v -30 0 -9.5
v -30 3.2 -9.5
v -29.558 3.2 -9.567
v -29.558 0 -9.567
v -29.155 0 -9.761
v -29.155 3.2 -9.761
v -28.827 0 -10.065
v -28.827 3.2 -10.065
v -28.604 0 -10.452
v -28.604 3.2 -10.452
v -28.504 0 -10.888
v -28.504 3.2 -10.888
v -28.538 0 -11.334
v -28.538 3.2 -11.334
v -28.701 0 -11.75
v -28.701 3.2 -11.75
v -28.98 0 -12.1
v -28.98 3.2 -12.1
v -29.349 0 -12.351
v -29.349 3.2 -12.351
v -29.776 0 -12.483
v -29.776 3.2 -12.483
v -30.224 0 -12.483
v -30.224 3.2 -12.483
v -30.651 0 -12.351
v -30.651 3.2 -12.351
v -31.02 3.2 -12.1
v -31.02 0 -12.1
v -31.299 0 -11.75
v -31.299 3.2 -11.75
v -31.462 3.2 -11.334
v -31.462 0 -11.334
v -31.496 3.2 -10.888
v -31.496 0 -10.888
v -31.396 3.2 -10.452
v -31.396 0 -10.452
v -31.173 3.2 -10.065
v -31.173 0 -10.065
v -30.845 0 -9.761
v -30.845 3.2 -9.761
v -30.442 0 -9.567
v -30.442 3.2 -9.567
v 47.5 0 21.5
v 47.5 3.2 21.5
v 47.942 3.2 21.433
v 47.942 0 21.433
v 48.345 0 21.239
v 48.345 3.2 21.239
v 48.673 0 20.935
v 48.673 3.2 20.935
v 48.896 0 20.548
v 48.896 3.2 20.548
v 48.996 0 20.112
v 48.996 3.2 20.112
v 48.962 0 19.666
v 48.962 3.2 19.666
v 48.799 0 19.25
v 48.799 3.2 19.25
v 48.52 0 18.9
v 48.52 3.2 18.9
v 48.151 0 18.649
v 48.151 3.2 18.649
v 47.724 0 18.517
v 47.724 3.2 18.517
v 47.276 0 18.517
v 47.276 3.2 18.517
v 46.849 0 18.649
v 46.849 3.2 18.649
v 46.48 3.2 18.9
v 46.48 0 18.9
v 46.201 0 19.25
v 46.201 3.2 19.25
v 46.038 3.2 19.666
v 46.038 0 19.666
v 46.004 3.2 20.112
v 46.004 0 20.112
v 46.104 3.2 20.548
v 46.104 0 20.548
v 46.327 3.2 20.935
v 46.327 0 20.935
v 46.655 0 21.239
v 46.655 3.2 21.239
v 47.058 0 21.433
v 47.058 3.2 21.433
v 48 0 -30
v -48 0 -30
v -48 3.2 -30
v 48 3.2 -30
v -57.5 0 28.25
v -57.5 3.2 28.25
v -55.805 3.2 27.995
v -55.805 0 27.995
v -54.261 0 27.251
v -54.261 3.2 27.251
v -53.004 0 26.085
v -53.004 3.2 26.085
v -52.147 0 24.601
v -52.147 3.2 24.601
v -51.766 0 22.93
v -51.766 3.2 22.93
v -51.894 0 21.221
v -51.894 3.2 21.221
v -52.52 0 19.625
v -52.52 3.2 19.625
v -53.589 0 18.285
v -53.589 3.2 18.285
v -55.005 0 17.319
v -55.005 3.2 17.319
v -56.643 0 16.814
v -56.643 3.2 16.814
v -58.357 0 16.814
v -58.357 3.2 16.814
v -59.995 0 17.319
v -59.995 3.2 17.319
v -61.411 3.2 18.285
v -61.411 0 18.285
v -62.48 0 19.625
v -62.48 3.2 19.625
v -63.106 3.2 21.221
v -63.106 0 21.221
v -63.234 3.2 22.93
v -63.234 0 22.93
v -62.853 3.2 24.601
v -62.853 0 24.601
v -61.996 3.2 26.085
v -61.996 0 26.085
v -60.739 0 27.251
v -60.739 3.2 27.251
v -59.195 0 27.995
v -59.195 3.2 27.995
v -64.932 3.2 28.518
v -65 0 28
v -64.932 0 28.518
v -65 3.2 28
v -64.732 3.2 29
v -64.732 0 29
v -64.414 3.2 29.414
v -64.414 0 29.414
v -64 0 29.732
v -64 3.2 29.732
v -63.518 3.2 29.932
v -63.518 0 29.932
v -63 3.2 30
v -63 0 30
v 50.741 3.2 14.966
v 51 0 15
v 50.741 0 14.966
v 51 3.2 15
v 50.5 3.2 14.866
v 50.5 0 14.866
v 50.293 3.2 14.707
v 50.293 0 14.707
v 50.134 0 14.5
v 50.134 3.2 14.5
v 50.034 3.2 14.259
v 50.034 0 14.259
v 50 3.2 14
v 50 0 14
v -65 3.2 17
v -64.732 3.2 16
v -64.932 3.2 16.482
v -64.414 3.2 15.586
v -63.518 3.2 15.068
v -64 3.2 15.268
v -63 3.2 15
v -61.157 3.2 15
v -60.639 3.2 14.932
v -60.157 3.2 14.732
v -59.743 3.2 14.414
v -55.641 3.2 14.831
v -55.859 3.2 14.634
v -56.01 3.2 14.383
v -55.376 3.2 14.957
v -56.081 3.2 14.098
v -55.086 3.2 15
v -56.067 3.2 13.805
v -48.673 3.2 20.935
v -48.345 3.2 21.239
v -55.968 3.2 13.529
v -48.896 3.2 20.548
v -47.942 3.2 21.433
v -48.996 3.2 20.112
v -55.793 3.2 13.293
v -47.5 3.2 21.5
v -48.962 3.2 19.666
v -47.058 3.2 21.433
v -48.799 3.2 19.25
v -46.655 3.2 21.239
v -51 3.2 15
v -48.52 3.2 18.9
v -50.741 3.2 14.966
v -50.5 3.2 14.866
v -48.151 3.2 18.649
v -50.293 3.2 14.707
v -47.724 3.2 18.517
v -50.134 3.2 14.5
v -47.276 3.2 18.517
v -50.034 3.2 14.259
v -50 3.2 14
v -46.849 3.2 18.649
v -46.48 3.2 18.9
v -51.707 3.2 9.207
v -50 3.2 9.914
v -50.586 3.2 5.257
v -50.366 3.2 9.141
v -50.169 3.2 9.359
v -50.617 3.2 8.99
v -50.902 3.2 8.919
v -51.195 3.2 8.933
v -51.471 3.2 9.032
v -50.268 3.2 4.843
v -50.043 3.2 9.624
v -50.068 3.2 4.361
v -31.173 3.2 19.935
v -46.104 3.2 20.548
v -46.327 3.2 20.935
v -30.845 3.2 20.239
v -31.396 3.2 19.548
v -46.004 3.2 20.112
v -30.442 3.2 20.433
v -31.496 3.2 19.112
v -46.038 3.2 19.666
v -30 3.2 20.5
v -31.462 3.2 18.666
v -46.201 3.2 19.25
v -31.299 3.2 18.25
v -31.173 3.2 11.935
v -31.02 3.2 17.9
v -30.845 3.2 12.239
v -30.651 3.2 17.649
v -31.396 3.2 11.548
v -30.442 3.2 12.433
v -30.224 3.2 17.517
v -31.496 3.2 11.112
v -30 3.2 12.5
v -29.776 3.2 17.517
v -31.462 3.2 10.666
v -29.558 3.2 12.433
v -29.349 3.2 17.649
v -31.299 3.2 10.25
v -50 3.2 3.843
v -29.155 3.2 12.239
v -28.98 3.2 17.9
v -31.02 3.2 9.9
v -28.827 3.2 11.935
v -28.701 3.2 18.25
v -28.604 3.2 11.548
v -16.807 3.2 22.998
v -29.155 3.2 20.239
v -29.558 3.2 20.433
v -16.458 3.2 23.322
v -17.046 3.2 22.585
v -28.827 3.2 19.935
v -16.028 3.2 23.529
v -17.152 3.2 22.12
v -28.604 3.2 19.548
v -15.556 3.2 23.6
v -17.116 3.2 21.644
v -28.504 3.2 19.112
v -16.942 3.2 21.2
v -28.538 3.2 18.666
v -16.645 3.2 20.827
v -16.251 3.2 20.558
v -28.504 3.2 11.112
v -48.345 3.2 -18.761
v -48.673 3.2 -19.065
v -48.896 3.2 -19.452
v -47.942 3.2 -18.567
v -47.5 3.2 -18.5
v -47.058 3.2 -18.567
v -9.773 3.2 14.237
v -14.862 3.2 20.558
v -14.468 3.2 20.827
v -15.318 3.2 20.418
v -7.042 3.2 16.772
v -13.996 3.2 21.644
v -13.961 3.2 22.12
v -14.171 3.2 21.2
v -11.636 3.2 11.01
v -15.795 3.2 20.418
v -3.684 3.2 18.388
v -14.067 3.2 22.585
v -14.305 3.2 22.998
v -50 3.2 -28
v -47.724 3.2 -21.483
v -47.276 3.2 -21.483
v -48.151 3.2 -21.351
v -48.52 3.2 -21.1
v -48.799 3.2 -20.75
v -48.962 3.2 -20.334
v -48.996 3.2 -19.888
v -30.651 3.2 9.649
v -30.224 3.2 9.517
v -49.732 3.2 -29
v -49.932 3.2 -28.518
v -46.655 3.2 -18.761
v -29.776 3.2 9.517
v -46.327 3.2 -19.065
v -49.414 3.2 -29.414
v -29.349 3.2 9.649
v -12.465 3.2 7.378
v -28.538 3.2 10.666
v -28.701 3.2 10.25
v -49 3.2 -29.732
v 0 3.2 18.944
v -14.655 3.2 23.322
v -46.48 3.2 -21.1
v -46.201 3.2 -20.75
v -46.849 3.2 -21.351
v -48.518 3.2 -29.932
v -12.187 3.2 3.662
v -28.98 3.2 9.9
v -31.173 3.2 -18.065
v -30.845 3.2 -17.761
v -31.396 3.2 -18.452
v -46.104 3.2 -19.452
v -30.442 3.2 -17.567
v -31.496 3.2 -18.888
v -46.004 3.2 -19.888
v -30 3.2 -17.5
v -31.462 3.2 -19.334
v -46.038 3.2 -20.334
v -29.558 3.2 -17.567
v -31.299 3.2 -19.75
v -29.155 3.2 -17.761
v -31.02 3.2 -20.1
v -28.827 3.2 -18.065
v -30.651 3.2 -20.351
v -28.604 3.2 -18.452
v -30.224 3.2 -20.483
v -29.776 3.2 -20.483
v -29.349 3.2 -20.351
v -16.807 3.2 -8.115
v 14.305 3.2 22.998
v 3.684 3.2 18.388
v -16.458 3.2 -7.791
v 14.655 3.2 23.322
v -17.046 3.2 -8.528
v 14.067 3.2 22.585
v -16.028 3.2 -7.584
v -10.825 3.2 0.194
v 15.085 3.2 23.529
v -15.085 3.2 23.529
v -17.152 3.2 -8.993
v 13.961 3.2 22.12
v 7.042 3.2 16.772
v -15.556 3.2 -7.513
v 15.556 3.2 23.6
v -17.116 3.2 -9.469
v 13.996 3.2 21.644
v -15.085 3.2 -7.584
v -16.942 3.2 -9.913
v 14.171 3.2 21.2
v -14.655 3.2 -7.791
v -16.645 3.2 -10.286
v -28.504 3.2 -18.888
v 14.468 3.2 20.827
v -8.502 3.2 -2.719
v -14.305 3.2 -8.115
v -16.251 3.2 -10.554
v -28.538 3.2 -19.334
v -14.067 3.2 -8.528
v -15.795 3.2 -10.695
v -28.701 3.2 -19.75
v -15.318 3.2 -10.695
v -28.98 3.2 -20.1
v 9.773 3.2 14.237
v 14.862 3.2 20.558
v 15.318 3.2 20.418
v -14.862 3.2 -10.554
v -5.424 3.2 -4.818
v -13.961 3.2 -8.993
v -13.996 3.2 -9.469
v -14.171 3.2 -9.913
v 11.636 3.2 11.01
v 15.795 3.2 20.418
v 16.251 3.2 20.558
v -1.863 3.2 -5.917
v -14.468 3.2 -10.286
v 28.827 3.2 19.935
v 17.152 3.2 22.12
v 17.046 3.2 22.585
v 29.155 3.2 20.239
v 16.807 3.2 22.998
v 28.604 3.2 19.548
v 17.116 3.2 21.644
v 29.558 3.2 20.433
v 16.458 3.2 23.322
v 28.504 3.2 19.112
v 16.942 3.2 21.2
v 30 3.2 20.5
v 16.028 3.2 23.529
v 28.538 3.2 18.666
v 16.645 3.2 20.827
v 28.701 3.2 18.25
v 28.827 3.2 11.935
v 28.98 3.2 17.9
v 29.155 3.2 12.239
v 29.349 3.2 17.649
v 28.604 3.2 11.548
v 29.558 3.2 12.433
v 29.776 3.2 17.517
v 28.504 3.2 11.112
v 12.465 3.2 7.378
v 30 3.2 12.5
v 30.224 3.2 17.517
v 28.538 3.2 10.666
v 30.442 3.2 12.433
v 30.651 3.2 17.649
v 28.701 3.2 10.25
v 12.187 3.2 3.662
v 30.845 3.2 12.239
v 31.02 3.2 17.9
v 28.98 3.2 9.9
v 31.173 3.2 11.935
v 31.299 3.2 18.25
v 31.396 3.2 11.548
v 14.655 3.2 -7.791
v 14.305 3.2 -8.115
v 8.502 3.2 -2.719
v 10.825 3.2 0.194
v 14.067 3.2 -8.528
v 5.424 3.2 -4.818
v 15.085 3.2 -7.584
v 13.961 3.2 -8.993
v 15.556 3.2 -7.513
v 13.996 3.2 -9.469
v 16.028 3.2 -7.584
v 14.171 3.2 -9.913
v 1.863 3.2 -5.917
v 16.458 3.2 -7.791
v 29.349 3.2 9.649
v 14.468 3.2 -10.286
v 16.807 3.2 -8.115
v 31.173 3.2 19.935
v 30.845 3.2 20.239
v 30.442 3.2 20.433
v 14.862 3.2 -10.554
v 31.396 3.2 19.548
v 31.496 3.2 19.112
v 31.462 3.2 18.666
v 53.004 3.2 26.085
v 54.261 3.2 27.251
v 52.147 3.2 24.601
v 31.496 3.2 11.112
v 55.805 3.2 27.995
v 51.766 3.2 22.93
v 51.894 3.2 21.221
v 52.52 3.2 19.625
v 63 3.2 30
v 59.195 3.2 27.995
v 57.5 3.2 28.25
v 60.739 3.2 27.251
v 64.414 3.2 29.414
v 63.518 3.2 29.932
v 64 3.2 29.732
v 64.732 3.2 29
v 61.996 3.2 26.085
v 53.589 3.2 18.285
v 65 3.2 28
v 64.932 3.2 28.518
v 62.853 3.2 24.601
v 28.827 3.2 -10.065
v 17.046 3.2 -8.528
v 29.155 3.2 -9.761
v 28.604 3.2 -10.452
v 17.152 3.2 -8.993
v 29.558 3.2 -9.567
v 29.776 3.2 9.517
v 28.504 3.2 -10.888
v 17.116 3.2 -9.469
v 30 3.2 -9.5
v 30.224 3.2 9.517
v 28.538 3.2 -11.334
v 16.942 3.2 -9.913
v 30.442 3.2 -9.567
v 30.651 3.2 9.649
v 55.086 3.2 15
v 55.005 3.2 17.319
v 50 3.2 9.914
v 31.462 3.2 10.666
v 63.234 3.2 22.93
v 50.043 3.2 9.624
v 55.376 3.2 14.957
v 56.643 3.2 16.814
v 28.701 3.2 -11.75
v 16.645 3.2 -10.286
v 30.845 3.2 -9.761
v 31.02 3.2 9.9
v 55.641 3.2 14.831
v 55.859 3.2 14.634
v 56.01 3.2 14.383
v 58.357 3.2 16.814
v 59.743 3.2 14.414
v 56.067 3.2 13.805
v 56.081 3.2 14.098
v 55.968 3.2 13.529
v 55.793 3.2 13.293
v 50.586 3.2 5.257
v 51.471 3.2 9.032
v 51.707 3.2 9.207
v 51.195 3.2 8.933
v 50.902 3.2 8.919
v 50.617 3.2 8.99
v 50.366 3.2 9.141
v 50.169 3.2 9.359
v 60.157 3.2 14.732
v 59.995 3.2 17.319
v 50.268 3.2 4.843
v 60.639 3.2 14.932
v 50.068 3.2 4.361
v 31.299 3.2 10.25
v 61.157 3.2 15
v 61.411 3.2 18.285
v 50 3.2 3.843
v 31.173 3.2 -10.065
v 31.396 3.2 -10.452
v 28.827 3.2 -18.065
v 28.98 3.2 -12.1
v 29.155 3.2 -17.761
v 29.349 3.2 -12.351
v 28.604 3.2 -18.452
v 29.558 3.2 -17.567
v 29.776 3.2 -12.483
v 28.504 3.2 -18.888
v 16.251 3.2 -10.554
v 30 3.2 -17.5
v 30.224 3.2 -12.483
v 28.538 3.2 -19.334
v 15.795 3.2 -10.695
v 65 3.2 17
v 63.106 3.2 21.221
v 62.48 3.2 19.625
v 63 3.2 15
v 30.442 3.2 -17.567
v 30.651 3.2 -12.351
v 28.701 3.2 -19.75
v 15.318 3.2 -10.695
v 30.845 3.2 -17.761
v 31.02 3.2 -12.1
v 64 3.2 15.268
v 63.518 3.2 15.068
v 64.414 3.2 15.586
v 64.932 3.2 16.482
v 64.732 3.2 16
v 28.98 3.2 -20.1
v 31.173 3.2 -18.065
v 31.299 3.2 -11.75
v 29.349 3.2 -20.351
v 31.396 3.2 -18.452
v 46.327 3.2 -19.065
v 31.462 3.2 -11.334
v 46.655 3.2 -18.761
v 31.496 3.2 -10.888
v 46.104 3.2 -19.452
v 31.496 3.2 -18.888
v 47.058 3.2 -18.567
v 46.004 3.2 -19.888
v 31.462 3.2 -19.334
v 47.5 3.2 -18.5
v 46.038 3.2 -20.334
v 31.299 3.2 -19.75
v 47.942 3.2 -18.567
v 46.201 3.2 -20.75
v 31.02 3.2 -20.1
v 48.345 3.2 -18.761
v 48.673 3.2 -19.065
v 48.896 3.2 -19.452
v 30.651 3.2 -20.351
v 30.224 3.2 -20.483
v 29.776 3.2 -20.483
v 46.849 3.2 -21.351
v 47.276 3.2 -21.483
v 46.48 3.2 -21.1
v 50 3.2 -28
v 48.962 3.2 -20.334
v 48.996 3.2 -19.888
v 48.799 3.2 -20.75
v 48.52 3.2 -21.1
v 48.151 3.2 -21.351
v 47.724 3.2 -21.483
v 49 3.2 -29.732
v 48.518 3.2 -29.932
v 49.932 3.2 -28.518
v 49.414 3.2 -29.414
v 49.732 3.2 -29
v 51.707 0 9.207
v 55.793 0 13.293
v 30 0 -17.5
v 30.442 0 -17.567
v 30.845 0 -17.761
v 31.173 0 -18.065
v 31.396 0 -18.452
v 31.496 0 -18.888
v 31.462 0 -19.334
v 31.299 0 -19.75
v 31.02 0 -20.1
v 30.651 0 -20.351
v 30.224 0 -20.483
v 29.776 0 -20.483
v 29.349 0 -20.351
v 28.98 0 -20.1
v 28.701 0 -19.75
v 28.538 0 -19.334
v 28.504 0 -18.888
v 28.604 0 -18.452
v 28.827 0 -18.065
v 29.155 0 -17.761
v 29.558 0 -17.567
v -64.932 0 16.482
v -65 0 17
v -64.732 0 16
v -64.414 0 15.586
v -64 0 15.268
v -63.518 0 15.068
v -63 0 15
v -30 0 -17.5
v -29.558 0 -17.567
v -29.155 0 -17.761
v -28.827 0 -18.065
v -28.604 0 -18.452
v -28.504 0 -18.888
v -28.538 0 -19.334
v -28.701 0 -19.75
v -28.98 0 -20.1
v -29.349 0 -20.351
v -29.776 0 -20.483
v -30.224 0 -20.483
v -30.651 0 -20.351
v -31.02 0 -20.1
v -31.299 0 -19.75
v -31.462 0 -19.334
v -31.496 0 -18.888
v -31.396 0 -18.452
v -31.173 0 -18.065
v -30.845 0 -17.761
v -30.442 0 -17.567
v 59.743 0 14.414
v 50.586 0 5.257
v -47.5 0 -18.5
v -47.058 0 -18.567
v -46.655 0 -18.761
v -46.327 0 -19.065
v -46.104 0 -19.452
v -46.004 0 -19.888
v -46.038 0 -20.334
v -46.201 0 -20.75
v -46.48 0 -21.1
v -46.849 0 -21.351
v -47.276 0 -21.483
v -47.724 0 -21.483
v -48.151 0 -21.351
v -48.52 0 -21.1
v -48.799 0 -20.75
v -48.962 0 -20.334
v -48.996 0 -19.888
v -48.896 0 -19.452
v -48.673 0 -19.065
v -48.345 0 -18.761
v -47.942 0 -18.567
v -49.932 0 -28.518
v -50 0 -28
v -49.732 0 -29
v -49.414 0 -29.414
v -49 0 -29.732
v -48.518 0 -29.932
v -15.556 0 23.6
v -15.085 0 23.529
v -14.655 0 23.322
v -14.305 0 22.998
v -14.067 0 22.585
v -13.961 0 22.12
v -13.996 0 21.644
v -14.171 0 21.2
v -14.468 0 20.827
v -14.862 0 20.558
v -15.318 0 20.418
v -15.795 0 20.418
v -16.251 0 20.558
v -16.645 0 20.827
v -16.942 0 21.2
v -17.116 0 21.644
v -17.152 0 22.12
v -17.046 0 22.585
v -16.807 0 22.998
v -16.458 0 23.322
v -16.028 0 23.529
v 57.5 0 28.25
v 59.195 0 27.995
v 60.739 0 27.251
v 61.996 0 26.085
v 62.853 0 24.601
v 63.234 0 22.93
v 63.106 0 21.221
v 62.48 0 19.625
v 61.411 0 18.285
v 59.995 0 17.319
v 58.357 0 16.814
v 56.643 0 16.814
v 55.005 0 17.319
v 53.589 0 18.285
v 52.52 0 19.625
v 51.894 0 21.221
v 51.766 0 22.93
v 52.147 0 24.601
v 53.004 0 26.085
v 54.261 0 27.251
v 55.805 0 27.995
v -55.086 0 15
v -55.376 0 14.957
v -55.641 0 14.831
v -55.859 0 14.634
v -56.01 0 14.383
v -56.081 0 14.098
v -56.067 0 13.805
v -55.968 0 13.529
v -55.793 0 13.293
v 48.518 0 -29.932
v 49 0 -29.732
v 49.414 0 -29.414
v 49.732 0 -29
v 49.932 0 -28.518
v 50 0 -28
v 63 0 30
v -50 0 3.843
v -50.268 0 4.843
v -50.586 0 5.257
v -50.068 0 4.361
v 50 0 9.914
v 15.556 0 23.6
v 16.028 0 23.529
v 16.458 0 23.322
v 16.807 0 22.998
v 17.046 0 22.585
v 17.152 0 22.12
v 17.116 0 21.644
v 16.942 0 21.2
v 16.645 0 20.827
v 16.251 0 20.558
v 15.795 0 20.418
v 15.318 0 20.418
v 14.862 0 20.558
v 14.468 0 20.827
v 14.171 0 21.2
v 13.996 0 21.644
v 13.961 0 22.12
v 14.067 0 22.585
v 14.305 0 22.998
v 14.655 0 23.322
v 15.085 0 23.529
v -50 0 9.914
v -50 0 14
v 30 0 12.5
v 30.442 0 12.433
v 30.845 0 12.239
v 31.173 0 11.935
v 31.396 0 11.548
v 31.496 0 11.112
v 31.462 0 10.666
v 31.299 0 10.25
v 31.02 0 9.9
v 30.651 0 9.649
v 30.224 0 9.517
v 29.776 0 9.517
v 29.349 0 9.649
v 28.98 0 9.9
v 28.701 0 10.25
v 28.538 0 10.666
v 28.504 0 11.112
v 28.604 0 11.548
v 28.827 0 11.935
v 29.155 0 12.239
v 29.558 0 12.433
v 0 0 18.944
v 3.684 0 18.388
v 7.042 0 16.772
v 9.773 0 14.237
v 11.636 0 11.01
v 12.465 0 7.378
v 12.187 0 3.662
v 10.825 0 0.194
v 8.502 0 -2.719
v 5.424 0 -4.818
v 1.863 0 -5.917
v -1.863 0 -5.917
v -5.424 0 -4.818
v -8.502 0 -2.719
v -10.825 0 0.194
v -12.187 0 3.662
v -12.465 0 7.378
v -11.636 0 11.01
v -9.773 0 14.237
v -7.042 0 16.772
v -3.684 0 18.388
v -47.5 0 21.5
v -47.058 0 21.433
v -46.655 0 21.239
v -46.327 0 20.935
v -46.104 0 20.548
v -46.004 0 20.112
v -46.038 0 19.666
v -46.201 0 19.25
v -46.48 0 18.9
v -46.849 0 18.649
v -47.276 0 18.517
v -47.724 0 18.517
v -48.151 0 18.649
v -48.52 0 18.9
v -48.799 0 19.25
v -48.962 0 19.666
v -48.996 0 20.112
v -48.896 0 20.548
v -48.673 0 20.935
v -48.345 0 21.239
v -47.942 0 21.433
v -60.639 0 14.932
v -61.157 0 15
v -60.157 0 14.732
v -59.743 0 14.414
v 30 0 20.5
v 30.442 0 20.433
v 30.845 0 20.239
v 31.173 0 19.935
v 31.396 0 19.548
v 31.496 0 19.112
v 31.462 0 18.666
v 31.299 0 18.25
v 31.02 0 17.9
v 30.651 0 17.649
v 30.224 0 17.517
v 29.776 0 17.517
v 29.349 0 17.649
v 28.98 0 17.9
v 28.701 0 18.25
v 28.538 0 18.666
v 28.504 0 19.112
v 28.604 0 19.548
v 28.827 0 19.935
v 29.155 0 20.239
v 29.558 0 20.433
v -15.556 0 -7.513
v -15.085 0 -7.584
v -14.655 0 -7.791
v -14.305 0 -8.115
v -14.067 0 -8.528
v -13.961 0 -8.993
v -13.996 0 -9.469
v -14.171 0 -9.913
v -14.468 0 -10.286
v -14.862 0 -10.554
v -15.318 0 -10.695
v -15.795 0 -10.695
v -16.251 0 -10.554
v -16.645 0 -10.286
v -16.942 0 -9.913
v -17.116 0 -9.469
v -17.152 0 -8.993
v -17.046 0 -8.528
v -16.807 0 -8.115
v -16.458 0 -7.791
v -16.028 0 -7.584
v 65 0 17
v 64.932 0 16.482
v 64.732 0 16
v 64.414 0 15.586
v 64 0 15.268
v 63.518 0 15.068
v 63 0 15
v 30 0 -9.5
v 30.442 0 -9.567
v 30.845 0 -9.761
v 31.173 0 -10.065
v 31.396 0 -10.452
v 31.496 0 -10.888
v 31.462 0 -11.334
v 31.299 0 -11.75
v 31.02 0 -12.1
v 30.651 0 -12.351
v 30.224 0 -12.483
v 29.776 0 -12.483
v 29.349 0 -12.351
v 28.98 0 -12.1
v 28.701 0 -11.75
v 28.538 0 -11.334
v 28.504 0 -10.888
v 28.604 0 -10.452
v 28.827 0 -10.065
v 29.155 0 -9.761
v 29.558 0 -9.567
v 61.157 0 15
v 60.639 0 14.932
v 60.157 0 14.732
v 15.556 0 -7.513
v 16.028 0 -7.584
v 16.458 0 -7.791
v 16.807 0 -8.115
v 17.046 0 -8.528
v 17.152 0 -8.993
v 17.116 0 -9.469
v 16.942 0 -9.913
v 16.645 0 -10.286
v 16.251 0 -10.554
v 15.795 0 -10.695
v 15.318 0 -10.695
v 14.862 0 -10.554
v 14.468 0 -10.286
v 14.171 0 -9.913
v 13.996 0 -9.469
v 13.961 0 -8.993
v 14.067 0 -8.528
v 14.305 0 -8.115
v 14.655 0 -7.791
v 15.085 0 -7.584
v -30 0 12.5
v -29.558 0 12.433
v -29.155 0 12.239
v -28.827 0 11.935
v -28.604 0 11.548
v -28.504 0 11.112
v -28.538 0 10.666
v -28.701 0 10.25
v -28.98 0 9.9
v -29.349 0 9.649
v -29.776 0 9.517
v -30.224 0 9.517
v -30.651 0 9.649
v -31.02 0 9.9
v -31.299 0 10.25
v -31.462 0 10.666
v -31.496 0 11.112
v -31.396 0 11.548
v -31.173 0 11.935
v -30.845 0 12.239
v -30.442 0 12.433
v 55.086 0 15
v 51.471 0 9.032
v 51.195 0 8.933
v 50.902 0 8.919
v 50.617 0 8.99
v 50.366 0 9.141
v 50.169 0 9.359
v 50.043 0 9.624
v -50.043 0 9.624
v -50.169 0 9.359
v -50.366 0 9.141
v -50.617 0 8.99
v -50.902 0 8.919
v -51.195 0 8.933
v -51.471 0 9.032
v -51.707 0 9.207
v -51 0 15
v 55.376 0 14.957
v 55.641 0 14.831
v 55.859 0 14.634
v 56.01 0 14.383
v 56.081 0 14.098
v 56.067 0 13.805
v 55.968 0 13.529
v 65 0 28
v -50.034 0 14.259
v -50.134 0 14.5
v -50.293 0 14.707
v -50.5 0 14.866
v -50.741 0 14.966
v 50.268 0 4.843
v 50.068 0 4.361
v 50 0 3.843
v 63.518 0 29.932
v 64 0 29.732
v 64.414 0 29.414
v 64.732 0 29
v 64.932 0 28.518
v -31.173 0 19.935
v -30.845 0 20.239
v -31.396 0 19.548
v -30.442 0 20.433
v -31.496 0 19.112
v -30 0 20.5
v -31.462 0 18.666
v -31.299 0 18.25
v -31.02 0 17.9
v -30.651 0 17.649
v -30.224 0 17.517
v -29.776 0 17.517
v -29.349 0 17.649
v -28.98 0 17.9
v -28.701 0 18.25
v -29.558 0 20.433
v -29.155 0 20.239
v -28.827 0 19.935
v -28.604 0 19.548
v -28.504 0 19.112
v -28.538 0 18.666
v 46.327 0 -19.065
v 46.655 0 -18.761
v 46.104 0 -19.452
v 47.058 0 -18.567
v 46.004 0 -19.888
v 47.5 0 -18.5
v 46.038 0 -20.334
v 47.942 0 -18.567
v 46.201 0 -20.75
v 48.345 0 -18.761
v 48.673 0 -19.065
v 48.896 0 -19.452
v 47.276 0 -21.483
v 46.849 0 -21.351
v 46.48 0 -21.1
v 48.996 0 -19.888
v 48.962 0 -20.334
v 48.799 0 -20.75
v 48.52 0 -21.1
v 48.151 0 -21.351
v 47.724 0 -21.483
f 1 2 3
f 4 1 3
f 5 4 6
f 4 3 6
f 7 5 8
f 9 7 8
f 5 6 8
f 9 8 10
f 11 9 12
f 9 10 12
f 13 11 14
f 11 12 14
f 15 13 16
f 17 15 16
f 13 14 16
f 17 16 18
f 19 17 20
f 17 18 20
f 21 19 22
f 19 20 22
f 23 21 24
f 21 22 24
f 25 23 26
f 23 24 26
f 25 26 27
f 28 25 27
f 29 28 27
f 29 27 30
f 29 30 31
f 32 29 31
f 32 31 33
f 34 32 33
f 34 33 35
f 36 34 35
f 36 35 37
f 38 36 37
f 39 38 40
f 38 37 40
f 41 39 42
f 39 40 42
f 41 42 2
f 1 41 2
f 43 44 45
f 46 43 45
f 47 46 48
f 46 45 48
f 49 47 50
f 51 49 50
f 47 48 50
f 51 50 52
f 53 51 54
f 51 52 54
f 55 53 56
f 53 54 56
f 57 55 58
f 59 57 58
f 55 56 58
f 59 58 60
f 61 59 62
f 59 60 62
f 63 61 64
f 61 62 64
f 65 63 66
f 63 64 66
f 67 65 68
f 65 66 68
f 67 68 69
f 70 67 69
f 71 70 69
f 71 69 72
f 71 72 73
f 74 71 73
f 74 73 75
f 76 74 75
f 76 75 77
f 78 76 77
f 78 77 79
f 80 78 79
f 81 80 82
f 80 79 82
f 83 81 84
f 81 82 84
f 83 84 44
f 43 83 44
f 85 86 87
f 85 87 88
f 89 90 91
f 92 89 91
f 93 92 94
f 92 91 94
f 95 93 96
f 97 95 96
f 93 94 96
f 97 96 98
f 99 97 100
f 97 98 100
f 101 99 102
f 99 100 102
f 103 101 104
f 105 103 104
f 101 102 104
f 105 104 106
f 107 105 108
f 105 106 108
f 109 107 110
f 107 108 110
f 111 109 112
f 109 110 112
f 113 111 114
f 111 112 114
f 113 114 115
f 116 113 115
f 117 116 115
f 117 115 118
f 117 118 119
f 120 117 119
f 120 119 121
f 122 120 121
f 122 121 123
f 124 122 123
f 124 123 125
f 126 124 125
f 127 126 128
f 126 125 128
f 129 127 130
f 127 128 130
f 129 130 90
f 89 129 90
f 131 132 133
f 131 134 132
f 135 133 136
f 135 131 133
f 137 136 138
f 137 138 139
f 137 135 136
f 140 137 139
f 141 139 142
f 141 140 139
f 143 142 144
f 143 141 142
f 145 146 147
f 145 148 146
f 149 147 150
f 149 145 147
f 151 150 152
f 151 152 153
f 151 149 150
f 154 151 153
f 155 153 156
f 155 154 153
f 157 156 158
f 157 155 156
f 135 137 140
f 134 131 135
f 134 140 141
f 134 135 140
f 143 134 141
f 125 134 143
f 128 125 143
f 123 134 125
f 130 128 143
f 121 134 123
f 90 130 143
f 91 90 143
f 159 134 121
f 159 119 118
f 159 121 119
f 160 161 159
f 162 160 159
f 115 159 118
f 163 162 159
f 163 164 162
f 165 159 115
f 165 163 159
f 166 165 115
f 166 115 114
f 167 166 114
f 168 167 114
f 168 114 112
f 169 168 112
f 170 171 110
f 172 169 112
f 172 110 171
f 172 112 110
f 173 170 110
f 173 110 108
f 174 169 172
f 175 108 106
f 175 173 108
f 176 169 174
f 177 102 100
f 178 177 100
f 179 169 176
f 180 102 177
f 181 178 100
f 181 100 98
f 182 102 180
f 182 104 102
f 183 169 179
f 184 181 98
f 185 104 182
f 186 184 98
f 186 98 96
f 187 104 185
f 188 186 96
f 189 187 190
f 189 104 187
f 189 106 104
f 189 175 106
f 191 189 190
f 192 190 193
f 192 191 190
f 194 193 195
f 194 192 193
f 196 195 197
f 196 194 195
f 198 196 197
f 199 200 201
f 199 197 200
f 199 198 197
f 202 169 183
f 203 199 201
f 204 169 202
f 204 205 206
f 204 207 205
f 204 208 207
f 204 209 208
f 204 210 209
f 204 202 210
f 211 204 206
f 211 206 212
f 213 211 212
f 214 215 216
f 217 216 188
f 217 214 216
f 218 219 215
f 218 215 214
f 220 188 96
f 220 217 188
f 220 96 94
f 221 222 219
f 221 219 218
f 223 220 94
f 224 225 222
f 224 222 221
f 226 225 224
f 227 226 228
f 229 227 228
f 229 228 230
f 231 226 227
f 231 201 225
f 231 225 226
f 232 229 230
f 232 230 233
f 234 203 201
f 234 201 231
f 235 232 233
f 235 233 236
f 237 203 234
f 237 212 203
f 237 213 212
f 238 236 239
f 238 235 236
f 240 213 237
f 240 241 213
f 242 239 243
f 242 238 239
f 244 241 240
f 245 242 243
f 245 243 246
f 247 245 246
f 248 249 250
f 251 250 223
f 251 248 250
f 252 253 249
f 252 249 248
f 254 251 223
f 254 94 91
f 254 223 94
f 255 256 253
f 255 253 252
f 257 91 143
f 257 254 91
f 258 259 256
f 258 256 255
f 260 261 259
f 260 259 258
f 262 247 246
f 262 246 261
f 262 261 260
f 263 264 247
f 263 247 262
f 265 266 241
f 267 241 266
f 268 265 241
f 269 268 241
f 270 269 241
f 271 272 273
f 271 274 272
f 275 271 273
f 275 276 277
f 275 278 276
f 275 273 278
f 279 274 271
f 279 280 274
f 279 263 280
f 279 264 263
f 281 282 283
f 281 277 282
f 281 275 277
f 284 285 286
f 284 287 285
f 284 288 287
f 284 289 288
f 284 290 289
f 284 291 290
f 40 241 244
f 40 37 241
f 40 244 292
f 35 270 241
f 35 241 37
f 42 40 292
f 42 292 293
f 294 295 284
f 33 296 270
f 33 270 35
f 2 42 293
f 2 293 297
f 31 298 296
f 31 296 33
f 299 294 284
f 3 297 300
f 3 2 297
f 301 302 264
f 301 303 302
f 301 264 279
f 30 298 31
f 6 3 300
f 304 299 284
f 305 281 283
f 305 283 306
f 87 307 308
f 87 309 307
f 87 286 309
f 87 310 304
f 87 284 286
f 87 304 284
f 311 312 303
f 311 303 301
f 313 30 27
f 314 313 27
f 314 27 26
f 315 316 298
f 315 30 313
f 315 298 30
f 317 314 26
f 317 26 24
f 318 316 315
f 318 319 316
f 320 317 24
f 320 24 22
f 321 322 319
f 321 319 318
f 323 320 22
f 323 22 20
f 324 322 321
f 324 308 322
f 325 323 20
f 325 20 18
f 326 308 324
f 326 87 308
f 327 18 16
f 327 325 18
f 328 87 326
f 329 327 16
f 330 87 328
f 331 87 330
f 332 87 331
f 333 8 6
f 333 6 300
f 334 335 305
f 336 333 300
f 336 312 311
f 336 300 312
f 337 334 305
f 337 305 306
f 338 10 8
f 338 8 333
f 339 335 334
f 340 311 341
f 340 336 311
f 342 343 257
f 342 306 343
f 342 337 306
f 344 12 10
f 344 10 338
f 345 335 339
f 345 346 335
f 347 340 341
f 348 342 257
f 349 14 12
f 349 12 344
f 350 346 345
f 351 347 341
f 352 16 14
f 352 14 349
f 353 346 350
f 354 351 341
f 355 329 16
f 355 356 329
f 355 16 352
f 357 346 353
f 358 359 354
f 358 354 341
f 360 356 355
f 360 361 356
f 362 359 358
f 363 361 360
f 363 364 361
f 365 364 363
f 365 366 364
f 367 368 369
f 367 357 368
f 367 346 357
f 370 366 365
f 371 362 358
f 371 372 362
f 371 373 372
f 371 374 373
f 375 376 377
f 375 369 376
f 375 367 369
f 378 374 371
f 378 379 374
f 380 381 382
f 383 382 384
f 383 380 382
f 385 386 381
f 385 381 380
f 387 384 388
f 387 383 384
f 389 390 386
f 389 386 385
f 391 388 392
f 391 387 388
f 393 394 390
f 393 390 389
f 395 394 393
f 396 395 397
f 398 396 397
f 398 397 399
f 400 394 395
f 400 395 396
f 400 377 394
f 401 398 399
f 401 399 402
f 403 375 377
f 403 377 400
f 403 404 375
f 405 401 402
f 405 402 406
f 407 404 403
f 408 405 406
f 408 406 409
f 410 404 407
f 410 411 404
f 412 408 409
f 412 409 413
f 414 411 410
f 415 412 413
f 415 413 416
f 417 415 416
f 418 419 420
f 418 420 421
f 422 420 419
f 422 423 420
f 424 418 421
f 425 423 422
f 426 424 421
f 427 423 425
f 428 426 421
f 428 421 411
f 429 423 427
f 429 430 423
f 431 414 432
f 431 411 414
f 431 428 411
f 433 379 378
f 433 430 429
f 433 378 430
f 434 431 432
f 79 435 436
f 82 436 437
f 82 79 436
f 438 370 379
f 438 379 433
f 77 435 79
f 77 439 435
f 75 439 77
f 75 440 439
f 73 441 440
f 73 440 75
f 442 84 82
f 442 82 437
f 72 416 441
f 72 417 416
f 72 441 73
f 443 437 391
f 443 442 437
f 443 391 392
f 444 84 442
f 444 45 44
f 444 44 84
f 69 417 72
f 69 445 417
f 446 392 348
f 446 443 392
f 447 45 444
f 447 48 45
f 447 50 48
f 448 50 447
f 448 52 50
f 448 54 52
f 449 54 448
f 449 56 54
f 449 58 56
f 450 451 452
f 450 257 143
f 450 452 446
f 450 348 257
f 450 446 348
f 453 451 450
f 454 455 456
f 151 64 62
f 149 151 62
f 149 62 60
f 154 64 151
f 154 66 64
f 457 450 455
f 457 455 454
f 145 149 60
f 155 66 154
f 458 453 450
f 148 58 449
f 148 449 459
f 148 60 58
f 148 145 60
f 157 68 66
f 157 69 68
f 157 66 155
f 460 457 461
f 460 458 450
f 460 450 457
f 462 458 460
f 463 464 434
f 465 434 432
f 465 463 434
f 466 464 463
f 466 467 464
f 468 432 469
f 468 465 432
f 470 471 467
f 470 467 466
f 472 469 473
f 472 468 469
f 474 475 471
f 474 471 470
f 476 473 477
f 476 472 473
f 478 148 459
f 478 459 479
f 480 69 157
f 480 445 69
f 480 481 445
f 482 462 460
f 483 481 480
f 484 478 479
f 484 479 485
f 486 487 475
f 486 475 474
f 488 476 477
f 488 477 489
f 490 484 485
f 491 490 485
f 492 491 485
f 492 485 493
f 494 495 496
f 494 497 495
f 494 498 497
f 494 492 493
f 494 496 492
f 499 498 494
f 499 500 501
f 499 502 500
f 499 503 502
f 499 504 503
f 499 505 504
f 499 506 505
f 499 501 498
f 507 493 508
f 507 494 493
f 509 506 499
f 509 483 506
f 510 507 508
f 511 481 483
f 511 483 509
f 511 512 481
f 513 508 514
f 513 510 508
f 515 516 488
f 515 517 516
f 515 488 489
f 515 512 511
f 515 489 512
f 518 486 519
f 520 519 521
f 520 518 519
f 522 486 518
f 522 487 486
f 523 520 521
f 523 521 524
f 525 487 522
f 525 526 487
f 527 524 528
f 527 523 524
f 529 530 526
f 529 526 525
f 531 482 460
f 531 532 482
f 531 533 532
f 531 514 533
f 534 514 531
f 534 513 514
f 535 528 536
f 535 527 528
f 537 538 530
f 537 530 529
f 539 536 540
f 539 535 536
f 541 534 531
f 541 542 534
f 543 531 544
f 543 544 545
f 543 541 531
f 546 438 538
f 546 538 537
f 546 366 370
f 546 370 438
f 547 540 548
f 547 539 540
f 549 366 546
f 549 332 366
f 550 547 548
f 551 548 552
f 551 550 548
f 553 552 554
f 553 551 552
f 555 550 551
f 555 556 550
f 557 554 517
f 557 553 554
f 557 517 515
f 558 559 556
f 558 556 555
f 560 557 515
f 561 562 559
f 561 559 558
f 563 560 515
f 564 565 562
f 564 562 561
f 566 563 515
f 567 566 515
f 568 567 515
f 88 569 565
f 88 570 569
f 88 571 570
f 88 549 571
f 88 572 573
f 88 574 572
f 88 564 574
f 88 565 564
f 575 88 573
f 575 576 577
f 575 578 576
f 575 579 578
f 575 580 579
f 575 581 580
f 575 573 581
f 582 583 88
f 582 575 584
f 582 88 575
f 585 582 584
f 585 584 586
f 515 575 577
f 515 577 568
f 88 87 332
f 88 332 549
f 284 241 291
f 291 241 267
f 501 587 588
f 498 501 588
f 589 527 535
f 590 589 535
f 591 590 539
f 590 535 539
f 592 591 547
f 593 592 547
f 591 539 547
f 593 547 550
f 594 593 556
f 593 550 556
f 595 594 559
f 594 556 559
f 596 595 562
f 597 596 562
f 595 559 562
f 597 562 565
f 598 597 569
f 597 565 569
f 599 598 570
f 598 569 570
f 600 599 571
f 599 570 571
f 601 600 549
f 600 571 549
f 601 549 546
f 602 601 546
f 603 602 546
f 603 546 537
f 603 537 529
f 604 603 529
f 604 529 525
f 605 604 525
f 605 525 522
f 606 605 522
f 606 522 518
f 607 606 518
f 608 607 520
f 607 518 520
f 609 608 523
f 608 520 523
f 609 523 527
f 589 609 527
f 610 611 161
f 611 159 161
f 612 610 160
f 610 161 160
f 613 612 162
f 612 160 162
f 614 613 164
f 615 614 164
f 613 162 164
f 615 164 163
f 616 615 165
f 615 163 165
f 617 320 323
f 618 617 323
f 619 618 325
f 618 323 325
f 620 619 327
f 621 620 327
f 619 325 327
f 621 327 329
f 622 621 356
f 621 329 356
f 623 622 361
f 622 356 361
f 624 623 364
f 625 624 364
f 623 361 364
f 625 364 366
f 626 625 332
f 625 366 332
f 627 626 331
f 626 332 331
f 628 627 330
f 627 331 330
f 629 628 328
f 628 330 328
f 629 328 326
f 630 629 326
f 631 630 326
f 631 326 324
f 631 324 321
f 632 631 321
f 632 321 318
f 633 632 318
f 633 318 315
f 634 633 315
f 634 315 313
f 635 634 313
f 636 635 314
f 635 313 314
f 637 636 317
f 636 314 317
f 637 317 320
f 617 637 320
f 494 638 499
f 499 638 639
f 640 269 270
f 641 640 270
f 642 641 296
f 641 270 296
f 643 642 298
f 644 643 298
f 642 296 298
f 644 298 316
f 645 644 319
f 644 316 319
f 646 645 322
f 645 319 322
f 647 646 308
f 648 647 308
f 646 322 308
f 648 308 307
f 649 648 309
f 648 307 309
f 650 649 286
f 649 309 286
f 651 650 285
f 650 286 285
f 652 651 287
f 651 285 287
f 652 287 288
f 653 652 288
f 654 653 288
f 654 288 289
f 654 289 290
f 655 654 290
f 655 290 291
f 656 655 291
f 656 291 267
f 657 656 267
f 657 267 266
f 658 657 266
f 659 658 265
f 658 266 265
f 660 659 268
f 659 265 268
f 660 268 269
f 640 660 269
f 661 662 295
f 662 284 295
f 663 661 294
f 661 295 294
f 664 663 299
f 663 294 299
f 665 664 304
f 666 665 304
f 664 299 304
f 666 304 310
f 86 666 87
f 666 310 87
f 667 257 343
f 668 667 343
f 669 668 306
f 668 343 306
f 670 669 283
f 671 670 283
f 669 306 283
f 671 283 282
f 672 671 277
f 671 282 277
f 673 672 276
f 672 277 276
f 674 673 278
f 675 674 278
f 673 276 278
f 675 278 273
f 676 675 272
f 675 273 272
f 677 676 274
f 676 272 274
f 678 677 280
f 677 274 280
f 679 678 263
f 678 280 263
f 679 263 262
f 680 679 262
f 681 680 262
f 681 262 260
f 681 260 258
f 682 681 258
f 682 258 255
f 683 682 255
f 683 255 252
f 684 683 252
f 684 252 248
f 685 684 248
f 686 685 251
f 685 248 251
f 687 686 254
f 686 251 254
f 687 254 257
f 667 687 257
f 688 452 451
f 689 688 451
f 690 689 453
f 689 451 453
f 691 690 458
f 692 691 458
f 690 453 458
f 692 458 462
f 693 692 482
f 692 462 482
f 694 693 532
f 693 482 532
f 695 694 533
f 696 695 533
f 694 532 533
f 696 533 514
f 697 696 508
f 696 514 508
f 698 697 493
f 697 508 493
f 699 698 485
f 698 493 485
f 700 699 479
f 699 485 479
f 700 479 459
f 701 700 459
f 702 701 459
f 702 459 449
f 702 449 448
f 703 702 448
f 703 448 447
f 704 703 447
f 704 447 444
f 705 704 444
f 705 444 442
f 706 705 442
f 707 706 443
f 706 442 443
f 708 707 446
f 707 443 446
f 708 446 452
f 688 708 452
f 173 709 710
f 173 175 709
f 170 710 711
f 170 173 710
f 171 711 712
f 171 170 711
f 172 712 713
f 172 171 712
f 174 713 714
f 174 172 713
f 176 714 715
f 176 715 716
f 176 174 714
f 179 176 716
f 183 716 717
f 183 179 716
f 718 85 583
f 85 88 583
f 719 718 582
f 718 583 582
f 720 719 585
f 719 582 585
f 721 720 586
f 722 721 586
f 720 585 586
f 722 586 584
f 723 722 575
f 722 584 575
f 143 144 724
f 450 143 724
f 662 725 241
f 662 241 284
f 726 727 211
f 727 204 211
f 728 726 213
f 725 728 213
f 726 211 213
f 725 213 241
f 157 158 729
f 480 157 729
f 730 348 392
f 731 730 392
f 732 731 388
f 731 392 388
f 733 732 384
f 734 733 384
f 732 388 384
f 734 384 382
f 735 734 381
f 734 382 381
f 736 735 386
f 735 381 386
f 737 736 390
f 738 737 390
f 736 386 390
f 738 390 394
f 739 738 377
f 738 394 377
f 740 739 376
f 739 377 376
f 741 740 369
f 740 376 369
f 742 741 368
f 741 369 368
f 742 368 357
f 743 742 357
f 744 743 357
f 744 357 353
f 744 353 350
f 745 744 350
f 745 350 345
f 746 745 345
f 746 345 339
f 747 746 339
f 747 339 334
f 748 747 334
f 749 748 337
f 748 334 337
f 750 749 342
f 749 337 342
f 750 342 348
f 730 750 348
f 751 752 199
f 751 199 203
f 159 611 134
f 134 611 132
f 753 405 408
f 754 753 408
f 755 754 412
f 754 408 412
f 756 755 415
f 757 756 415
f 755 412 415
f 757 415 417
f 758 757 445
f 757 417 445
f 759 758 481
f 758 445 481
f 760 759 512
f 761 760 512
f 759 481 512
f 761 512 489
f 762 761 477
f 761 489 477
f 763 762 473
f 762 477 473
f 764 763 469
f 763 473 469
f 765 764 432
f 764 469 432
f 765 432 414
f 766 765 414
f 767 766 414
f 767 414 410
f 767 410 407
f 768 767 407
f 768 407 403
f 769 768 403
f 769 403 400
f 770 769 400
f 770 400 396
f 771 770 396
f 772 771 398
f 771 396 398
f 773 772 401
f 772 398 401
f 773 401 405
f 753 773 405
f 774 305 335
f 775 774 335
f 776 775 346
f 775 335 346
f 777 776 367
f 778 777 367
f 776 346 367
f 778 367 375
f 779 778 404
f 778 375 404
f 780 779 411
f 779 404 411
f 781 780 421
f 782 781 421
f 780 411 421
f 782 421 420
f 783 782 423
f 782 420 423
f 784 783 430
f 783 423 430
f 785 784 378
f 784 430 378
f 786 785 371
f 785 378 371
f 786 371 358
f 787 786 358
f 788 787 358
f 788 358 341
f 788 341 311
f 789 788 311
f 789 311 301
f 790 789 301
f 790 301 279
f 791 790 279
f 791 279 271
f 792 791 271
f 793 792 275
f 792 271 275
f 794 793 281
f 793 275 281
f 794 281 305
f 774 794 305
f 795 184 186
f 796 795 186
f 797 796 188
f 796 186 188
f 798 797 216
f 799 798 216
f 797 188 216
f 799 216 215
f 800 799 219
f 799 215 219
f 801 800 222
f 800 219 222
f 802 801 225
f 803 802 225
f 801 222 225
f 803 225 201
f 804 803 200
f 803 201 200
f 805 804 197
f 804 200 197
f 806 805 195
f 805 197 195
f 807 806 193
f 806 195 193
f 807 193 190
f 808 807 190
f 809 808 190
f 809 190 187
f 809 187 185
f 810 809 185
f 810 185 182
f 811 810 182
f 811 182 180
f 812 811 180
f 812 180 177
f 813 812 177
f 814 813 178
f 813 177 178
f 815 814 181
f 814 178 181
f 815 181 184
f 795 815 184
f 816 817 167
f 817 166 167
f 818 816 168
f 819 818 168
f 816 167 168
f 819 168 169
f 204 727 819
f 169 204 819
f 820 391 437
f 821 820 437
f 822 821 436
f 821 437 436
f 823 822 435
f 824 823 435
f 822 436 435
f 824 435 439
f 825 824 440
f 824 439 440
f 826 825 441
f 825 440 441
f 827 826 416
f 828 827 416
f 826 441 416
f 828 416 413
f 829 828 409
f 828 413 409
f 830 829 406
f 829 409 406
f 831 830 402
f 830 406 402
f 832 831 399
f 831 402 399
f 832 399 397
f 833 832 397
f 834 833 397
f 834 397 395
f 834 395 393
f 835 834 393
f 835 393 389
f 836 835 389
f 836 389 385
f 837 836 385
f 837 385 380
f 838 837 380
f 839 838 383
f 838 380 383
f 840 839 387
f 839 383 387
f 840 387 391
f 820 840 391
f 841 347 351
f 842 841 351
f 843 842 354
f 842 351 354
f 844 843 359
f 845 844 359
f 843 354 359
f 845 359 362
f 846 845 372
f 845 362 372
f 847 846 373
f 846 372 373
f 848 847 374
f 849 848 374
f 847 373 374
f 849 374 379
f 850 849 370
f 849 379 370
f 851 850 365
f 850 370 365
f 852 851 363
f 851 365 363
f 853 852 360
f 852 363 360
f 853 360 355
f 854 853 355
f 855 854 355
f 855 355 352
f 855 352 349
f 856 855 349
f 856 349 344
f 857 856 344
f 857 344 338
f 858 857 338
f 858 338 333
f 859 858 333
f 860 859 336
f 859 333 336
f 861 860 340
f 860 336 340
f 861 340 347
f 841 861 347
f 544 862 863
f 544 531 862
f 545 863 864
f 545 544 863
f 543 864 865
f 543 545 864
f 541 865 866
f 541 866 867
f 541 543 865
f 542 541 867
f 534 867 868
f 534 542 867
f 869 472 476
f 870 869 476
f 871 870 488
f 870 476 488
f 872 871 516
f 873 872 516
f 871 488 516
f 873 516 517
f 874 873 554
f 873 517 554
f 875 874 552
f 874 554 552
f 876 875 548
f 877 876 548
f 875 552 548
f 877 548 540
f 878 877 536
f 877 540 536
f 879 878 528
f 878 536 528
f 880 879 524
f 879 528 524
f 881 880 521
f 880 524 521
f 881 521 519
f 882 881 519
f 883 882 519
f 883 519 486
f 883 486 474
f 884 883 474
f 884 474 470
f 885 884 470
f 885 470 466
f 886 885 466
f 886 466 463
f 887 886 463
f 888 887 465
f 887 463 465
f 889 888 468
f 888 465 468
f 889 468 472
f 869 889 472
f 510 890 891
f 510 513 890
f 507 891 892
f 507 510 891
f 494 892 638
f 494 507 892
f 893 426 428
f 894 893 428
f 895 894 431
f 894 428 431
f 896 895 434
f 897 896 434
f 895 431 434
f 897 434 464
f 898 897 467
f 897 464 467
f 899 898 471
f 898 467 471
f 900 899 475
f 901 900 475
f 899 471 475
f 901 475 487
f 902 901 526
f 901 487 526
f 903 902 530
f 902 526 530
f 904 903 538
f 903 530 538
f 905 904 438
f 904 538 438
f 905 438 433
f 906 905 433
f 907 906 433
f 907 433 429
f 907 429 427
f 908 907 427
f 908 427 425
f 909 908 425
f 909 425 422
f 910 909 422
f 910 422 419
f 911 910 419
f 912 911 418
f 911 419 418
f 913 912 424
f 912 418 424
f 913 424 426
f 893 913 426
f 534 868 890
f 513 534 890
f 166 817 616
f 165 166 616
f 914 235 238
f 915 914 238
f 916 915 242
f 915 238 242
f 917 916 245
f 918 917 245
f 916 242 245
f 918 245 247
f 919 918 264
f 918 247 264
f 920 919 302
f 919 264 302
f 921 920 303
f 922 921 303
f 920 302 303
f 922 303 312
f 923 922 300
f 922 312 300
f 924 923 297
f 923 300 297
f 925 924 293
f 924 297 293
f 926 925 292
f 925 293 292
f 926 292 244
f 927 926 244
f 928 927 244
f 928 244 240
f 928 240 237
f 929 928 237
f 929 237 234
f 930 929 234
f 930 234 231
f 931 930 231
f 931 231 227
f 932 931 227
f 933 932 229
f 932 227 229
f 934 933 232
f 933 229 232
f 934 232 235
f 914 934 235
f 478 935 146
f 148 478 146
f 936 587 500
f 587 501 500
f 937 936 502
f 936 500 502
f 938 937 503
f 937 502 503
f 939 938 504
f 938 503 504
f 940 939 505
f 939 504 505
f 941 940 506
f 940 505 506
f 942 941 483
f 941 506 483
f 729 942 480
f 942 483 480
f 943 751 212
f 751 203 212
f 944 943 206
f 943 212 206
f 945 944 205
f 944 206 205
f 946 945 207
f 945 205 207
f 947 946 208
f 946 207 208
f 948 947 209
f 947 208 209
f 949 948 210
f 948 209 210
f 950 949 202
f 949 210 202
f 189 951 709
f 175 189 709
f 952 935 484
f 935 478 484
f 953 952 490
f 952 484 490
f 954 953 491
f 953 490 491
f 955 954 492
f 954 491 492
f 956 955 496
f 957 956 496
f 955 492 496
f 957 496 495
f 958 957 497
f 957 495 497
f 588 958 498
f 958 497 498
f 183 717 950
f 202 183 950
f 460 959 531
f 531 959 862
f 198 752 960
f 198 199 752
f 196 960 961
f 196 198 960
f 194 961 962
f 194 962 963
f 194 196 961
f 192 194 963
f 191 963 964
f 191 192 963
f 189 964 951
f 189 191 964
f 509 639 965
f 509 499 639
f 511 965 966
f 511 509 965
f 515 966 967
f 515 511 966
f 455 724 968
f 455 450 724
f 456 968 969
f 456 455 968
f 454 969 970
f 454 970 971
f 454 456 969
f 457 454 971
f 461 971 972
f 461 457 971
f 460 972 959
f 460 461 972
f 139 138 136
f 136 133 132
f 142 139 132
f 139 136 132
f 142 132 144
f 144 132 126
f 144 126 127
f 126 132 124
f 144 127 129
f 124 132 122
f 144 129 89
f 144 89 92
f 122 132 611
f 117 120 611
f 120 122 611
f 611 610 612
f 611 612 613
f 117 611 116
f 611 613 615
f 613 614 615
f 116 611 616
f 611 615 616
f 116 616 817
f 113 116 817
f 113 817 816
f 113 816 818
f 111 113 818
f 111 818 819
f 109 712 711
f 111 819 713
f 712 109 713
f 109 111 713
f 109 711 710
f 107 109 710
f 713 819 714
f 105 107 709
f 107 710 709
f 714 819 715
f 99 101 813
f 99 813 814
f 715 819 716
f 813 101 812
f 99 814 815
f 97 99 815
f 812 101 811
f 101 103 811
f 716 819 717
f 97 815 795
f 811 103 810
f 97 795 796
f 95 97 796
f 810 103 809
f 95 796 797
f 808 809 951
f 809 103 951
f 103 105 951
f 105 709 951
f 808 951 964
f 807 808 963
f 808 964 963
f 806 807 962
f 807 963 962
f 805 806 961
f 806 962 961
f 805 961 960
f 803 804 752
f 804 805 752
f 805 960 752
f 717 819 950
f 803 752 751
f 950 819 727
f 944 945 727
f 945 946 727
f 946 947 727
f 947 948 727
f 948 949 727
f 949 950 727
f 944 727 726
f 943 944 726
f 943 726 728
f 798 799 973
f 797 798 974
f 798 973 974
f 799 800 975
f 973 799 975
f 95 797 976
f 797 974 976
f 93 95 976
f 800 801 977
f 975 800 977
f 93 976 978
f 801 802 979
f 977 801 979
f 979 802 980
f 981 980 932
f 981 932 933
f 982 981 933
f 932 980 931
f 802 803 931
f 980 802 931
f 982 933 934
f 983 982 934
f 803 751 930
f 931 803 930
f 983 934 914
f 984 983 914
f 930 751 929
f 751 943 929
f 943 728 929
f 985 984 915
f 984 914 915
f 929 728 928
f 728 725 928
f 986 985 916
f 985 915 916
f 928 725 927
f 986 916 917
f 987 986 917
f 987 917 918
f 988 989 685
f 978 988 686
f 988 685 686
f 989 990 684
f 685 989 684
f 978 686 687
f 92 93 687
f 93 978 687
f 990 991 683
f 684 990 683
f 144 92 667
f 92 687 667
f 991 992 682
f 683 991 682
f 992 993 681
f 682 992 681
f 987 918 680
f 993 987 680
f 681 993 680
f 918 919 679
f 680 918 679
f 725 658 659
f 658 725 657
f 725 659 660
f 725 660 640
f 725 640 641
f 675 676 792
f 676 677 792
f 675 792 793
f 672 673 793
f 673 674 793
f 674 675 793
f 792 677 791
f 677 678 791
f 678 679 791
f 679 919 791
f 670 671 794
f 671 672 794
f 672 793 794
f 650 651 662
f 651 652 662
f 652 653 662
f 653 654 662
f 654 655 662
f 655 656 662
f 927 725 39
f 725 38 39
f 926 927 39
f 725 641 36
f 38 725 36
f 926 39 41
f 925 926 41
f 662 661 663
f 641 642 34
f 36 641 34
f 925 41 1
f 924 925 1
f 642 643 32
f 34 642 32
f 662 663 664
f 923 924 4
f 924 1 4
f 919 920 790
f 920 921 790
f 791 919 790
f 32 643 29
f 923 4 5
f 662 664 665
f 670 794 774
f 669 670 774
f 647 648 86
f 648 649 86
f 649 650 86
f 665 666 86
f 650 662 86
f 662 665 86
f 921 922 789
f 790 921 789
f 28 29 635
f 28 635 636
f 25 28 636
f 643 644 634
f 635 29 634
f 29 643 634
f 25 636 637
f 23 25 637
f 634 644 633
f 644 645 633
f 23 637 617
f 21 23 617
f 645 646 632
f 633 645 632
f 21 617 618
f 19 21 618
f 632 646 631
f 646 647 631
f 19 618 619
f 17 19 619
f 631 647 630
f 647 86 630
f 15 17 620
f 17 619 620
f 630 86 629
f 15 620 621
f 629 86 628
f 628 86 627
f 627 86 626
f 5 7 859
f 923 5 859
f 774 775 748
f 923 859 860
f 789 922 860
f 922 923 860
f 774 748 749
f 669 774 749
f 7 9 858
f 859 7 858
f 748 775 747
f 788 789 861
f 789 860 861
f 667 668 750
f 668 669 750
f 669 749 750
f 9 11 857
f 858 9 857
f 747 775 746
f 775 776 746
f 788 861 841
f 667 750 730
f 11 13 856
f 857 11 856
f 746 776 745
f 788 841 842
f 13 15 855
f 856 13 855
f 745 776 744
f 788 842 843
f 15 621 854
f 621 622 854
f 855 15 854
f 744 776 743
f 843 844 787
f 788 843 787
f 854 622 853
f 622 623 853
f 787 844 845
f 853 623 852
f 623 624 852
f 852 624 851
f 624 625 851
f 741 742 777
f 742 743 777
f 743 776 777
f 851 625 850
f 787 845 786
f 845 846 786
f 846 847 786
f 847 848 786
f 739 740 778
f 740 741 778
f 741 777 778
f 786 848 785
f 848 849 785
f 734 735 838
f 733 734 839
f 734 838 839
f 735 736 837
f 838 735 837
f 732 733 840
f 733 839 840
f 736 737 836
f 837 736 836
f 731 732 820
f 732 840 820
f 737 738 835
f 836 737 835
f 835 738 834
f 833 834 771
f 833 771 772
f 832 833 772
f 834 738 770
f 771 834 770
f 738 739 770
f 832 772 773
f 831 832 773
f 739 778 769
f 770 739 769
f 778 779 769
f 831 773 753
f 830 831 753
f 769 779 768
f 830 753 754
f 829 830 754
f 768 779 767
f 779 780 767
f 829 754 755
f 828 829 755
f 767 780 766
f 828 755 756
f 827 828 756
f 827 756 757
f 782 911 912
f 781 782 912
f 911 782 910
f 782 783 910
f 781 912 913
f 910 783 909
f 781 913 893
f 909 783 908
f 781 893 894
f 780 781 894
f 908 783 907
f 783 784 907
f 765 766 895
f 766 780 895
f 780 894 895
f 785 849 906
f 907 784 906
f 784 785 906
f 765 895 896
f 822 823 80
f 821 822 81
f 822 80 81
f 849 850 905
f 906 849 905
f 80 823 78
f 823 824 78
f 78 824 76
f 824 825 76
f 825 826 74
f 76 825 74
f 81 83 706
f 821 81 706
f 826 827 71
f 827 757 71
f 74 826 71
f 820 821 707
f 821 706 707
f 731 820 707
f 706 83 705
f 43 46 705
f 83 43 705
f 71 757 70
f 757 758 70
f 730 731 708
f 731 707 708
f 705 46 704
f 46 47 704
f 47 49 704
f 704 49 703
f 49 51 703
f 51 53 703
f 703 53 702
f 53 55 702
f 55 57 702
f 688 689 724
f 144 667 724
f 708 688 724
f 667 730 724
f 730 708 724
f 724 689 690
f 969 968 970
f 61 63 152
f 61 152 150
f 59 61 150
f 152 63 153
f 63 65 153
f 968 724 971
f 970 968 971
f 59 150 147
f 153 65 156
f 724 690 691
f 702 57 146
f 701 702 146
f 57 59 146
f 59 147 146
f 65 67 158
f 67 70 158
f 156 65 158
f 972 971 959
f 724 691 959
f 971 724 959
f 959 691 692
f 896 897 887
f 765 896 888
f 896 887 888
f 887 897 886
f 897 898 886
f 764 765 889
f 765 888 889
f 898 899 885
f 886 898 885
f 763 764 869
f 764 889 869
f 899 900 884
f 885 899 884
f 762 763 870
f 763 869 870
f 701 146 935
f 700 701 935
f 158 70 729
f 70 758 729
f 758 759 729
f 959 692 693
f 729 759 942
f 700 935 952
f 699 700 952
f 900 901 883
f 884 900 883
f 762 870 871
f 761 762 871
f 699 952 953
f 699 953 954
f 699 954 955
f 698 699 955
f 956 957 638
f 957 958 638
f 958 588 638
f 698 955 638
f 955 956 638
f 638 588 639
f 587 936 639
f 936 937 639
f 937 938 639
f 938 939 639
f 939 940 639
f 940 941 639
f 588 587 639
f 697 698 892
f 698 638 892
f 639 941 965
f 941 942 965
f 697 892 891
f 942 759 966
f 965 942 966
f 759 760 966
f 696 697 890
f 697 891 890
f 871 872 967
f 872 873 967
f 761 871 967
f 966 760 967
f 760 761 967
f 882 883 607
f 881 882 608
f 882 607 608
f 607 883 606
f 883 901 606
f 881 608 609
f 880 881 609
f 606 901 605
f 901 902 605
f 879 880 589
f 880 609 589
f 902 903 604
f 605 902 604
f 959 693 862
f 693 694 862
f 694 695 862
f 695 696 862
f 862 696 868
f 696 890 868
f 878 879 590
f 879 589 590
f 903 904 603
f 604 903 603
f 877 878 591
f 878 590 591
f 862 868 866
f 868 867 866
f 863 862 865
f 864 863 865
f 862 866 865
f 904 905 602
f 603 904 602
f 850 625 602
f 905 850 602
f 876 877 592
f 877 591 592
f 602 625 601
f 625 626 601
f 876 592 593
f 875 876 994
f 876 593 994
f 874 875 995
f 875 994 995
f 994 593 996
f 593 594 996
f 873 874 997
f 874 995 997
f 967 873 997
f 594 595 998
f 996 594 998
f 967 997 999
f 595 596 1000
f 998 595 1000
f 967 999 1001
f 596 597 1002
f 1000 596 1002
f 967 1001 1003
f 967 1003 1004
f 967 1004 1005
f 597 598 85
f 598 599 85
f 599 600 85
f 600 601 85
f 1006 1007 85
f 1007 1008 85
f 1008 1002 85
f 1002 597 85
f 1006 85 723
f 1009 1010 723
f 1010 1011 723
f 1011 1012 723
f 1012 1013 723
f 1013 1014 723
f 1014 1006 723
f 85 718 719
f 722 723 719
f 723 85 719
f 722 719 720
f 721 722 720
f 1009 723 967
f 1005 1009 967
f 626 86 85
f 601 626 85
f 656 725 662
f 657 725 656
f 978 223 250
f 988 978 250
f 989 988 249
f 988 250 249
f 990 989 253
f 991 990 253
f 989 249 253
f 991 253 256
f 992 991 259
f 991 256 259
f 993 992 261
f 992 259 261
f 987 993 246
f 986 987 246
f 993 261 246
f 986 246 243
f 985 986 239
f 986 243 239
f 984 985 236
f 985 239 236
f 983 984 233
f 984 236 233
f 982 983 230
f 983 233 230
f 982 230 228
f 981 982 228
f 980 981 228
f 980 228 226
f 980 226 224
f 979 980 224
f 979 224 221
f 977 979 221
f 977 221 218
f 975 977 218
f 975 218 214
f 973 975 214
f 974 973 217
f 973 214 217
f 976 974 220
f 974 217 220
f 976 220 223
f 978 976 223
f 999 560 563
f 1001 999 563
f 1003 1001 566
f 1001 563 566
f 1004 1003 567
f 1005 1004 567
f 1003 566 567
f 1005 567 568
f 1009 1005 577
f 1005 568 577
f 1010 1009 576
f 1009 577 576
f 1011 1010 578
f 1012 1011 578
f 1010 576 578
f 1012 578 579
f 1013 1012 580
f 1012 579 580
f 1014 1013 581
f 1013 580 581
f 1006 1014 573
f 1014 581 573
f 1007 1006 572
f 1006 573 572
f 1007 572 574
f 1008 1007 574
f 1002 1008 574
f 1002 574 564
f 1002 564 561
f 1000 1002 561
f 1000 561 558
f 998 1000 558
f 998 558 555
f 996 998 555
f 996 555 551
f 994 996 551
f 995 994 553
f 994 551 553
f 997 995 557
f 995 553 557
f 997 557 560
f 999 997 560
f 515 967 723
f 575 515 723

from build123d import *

# Parameters (mm, degrees)
SKETCH_1_W          = 100
SKETCH_1_H          = 60
EXTRUDE_1_DEPTH     = 3.2
SKETCH_2_R          = 12.5
SKETCH_2_R_2        = 1.6
SKETCH_2_R_3        = 1.5
SKETCH_2_R_4        = 5.75
CUT_EXTRUDE_1_DEPTH = 3.2
FILLET_1_R          = 2
FILLET_2_R          = 1


with BuildPart() as part:
    # 草图1 → 凸台-拉伸1 (new body)
    with BuildSketch(Plane(origin=(0, 0, 0), x_dir=(1, 0, 0), z_dir=(0, 1, 0))):
        Polygon((-57.5, -15), (-60.328427125, -15), (-65, -15), (-65, -30), (-50, -30), (-50, -15), align=None)
        Rectangle(SKETCH_1_W, SKETCH_1_H)
        Polygon((-50, -7.5), (-50, -4.671572875), (-60.328427125, -15), (-57.5, -15), align=None)
        Polygon((65, -15), (60.328427125, -15), (57.5, -15), (50, -15), (50, -30), (65, -30), align=None)
        Polygon((60.328427125, -15), (50, -4.671572875), (50, -7.5), (57.5, -15), align=None)
    extrude(amount=EXTRUDE_1_DEPTH)

    # 草图2 → 切除-拉伸1 (cut)
    with BuildSketch(Plane(origin=(0, 3.2, 0), x_dir=(1, 0, 0), z_dir=(0, 1, 0))):
        with Locations(Location((0, -6.443650814, 0), (0, 0, 270))):
            Circle(SKETCH_2_R)
        with Locations(Location((15.556349186, -22, 0), (0, 0, 270))):
            Circle(SKETCH_2_R_2)
        with Locations(Location((15.556349186, 9.112698372, 0), (0, 0, 270))):
            Circle(SKETCH_2_R_2)
        with Locations(Location((-15.556349186, 9.112698372, 0), (0, 0, 270))):
            Circle(SKETCH_2_R_2)
        with Locations(Location((-15.556349186, -22, 0), (0, 0, 270))):
            Circle(SKETCH_2_R_2)
        with Locations(Location((-47.5, 20, 0), (0, 0, 270))):
            Circle(SKETCH_2_R_3)
        with Locations(Location((-47.5, -20, 0), (0, 0, 270))):
            Circle(SKETCH_2_R_3)
        with Locations(Location((47.5, -20, 0), (0, 0, 270))):
            Circle(SKETCH_2_R_3)
        with Locations(Location((47.5, 20, 0), (0, 0, 270))):
            Circle(SKETCH_2_R_3)
        with Locations(Location((-57.5, -22.5, 0), (0, 0, 270))):
            Circle(SKETCH_2_R_4)
        with Locations(Location((57.5, -22.5, 0), (0, 0, 270))):
            Circle(SKETCH_2_R_4)
        with Locations(Location((30, 19, 0), (0, 0, 270))):
            Circle(SKETCH_2_R_3)
        with Locations(Location((30, 11, 0), (0, 0, 270))):
            Circle(SKETCH_2_R_3)
        with Locations(Location((-30, 11, 0), (0, 0, 270))):
            Circle(SKETCH_2_R_3)
        with Locations(Location((-30, 19, 0), (0, 0, 270))):
            Circle(SKETCH_2_R_3)
        with Locations(Location((30, -11, 0), (0, 0, 270))):
            Circle(SKETCH_2_R_3)
        with Locations(Location((30, -19, 0), (0, 0, 270))):
            Circle(SKETCH_2_R_3)
        with Locations(Location((-30, -19, 0), (0, 0, 270))):
            Circle(SKETCH_2_R_3)
        with Locations(Location((-30, -11, 0), (0, 0, 270))):
            Circle(SKETCH_2_R_3)
    extrude(amount=-CUT_EXTRUDE_1_DEPTH, mode=Mode.SUBTRACT)

    # 圆角1
    fillet_1_edges = [part.edges().sort_by_distance(p)[0] for p in [
        (-60.328427125, 1.6, 15),
        (-50, 1.6, 4.671572875),
        (-50, 1.6, -30),
        (50, 1.6, -30),
        (50, 1.6, 4.671572875),
        (60.328427125, 1.6, 15),
        (65, 1.6, 15),
        (65, 1.6, 30),
        (-65, 1.6, 30),
        (-65, 1.6, 15),
    ]]
    fillet(fillet_1_edges, radius=FILLET_1_R)

    # 圆角2
    fillet_2_edges = [part.edges().sort_by_distance(p)[0] for p in [
        (-57.5, 1.6, 15),
        (-50, 1.6, 15),
        (-50, 1.6, 7.5),
        (50, 1.6, 7.5),
        (50, 1.6, 15),
        (57.5, 1.6, 15),
    ]]
    fillet(fillet_2_edges, radius=FILLET_2_R)


solid = part.part
